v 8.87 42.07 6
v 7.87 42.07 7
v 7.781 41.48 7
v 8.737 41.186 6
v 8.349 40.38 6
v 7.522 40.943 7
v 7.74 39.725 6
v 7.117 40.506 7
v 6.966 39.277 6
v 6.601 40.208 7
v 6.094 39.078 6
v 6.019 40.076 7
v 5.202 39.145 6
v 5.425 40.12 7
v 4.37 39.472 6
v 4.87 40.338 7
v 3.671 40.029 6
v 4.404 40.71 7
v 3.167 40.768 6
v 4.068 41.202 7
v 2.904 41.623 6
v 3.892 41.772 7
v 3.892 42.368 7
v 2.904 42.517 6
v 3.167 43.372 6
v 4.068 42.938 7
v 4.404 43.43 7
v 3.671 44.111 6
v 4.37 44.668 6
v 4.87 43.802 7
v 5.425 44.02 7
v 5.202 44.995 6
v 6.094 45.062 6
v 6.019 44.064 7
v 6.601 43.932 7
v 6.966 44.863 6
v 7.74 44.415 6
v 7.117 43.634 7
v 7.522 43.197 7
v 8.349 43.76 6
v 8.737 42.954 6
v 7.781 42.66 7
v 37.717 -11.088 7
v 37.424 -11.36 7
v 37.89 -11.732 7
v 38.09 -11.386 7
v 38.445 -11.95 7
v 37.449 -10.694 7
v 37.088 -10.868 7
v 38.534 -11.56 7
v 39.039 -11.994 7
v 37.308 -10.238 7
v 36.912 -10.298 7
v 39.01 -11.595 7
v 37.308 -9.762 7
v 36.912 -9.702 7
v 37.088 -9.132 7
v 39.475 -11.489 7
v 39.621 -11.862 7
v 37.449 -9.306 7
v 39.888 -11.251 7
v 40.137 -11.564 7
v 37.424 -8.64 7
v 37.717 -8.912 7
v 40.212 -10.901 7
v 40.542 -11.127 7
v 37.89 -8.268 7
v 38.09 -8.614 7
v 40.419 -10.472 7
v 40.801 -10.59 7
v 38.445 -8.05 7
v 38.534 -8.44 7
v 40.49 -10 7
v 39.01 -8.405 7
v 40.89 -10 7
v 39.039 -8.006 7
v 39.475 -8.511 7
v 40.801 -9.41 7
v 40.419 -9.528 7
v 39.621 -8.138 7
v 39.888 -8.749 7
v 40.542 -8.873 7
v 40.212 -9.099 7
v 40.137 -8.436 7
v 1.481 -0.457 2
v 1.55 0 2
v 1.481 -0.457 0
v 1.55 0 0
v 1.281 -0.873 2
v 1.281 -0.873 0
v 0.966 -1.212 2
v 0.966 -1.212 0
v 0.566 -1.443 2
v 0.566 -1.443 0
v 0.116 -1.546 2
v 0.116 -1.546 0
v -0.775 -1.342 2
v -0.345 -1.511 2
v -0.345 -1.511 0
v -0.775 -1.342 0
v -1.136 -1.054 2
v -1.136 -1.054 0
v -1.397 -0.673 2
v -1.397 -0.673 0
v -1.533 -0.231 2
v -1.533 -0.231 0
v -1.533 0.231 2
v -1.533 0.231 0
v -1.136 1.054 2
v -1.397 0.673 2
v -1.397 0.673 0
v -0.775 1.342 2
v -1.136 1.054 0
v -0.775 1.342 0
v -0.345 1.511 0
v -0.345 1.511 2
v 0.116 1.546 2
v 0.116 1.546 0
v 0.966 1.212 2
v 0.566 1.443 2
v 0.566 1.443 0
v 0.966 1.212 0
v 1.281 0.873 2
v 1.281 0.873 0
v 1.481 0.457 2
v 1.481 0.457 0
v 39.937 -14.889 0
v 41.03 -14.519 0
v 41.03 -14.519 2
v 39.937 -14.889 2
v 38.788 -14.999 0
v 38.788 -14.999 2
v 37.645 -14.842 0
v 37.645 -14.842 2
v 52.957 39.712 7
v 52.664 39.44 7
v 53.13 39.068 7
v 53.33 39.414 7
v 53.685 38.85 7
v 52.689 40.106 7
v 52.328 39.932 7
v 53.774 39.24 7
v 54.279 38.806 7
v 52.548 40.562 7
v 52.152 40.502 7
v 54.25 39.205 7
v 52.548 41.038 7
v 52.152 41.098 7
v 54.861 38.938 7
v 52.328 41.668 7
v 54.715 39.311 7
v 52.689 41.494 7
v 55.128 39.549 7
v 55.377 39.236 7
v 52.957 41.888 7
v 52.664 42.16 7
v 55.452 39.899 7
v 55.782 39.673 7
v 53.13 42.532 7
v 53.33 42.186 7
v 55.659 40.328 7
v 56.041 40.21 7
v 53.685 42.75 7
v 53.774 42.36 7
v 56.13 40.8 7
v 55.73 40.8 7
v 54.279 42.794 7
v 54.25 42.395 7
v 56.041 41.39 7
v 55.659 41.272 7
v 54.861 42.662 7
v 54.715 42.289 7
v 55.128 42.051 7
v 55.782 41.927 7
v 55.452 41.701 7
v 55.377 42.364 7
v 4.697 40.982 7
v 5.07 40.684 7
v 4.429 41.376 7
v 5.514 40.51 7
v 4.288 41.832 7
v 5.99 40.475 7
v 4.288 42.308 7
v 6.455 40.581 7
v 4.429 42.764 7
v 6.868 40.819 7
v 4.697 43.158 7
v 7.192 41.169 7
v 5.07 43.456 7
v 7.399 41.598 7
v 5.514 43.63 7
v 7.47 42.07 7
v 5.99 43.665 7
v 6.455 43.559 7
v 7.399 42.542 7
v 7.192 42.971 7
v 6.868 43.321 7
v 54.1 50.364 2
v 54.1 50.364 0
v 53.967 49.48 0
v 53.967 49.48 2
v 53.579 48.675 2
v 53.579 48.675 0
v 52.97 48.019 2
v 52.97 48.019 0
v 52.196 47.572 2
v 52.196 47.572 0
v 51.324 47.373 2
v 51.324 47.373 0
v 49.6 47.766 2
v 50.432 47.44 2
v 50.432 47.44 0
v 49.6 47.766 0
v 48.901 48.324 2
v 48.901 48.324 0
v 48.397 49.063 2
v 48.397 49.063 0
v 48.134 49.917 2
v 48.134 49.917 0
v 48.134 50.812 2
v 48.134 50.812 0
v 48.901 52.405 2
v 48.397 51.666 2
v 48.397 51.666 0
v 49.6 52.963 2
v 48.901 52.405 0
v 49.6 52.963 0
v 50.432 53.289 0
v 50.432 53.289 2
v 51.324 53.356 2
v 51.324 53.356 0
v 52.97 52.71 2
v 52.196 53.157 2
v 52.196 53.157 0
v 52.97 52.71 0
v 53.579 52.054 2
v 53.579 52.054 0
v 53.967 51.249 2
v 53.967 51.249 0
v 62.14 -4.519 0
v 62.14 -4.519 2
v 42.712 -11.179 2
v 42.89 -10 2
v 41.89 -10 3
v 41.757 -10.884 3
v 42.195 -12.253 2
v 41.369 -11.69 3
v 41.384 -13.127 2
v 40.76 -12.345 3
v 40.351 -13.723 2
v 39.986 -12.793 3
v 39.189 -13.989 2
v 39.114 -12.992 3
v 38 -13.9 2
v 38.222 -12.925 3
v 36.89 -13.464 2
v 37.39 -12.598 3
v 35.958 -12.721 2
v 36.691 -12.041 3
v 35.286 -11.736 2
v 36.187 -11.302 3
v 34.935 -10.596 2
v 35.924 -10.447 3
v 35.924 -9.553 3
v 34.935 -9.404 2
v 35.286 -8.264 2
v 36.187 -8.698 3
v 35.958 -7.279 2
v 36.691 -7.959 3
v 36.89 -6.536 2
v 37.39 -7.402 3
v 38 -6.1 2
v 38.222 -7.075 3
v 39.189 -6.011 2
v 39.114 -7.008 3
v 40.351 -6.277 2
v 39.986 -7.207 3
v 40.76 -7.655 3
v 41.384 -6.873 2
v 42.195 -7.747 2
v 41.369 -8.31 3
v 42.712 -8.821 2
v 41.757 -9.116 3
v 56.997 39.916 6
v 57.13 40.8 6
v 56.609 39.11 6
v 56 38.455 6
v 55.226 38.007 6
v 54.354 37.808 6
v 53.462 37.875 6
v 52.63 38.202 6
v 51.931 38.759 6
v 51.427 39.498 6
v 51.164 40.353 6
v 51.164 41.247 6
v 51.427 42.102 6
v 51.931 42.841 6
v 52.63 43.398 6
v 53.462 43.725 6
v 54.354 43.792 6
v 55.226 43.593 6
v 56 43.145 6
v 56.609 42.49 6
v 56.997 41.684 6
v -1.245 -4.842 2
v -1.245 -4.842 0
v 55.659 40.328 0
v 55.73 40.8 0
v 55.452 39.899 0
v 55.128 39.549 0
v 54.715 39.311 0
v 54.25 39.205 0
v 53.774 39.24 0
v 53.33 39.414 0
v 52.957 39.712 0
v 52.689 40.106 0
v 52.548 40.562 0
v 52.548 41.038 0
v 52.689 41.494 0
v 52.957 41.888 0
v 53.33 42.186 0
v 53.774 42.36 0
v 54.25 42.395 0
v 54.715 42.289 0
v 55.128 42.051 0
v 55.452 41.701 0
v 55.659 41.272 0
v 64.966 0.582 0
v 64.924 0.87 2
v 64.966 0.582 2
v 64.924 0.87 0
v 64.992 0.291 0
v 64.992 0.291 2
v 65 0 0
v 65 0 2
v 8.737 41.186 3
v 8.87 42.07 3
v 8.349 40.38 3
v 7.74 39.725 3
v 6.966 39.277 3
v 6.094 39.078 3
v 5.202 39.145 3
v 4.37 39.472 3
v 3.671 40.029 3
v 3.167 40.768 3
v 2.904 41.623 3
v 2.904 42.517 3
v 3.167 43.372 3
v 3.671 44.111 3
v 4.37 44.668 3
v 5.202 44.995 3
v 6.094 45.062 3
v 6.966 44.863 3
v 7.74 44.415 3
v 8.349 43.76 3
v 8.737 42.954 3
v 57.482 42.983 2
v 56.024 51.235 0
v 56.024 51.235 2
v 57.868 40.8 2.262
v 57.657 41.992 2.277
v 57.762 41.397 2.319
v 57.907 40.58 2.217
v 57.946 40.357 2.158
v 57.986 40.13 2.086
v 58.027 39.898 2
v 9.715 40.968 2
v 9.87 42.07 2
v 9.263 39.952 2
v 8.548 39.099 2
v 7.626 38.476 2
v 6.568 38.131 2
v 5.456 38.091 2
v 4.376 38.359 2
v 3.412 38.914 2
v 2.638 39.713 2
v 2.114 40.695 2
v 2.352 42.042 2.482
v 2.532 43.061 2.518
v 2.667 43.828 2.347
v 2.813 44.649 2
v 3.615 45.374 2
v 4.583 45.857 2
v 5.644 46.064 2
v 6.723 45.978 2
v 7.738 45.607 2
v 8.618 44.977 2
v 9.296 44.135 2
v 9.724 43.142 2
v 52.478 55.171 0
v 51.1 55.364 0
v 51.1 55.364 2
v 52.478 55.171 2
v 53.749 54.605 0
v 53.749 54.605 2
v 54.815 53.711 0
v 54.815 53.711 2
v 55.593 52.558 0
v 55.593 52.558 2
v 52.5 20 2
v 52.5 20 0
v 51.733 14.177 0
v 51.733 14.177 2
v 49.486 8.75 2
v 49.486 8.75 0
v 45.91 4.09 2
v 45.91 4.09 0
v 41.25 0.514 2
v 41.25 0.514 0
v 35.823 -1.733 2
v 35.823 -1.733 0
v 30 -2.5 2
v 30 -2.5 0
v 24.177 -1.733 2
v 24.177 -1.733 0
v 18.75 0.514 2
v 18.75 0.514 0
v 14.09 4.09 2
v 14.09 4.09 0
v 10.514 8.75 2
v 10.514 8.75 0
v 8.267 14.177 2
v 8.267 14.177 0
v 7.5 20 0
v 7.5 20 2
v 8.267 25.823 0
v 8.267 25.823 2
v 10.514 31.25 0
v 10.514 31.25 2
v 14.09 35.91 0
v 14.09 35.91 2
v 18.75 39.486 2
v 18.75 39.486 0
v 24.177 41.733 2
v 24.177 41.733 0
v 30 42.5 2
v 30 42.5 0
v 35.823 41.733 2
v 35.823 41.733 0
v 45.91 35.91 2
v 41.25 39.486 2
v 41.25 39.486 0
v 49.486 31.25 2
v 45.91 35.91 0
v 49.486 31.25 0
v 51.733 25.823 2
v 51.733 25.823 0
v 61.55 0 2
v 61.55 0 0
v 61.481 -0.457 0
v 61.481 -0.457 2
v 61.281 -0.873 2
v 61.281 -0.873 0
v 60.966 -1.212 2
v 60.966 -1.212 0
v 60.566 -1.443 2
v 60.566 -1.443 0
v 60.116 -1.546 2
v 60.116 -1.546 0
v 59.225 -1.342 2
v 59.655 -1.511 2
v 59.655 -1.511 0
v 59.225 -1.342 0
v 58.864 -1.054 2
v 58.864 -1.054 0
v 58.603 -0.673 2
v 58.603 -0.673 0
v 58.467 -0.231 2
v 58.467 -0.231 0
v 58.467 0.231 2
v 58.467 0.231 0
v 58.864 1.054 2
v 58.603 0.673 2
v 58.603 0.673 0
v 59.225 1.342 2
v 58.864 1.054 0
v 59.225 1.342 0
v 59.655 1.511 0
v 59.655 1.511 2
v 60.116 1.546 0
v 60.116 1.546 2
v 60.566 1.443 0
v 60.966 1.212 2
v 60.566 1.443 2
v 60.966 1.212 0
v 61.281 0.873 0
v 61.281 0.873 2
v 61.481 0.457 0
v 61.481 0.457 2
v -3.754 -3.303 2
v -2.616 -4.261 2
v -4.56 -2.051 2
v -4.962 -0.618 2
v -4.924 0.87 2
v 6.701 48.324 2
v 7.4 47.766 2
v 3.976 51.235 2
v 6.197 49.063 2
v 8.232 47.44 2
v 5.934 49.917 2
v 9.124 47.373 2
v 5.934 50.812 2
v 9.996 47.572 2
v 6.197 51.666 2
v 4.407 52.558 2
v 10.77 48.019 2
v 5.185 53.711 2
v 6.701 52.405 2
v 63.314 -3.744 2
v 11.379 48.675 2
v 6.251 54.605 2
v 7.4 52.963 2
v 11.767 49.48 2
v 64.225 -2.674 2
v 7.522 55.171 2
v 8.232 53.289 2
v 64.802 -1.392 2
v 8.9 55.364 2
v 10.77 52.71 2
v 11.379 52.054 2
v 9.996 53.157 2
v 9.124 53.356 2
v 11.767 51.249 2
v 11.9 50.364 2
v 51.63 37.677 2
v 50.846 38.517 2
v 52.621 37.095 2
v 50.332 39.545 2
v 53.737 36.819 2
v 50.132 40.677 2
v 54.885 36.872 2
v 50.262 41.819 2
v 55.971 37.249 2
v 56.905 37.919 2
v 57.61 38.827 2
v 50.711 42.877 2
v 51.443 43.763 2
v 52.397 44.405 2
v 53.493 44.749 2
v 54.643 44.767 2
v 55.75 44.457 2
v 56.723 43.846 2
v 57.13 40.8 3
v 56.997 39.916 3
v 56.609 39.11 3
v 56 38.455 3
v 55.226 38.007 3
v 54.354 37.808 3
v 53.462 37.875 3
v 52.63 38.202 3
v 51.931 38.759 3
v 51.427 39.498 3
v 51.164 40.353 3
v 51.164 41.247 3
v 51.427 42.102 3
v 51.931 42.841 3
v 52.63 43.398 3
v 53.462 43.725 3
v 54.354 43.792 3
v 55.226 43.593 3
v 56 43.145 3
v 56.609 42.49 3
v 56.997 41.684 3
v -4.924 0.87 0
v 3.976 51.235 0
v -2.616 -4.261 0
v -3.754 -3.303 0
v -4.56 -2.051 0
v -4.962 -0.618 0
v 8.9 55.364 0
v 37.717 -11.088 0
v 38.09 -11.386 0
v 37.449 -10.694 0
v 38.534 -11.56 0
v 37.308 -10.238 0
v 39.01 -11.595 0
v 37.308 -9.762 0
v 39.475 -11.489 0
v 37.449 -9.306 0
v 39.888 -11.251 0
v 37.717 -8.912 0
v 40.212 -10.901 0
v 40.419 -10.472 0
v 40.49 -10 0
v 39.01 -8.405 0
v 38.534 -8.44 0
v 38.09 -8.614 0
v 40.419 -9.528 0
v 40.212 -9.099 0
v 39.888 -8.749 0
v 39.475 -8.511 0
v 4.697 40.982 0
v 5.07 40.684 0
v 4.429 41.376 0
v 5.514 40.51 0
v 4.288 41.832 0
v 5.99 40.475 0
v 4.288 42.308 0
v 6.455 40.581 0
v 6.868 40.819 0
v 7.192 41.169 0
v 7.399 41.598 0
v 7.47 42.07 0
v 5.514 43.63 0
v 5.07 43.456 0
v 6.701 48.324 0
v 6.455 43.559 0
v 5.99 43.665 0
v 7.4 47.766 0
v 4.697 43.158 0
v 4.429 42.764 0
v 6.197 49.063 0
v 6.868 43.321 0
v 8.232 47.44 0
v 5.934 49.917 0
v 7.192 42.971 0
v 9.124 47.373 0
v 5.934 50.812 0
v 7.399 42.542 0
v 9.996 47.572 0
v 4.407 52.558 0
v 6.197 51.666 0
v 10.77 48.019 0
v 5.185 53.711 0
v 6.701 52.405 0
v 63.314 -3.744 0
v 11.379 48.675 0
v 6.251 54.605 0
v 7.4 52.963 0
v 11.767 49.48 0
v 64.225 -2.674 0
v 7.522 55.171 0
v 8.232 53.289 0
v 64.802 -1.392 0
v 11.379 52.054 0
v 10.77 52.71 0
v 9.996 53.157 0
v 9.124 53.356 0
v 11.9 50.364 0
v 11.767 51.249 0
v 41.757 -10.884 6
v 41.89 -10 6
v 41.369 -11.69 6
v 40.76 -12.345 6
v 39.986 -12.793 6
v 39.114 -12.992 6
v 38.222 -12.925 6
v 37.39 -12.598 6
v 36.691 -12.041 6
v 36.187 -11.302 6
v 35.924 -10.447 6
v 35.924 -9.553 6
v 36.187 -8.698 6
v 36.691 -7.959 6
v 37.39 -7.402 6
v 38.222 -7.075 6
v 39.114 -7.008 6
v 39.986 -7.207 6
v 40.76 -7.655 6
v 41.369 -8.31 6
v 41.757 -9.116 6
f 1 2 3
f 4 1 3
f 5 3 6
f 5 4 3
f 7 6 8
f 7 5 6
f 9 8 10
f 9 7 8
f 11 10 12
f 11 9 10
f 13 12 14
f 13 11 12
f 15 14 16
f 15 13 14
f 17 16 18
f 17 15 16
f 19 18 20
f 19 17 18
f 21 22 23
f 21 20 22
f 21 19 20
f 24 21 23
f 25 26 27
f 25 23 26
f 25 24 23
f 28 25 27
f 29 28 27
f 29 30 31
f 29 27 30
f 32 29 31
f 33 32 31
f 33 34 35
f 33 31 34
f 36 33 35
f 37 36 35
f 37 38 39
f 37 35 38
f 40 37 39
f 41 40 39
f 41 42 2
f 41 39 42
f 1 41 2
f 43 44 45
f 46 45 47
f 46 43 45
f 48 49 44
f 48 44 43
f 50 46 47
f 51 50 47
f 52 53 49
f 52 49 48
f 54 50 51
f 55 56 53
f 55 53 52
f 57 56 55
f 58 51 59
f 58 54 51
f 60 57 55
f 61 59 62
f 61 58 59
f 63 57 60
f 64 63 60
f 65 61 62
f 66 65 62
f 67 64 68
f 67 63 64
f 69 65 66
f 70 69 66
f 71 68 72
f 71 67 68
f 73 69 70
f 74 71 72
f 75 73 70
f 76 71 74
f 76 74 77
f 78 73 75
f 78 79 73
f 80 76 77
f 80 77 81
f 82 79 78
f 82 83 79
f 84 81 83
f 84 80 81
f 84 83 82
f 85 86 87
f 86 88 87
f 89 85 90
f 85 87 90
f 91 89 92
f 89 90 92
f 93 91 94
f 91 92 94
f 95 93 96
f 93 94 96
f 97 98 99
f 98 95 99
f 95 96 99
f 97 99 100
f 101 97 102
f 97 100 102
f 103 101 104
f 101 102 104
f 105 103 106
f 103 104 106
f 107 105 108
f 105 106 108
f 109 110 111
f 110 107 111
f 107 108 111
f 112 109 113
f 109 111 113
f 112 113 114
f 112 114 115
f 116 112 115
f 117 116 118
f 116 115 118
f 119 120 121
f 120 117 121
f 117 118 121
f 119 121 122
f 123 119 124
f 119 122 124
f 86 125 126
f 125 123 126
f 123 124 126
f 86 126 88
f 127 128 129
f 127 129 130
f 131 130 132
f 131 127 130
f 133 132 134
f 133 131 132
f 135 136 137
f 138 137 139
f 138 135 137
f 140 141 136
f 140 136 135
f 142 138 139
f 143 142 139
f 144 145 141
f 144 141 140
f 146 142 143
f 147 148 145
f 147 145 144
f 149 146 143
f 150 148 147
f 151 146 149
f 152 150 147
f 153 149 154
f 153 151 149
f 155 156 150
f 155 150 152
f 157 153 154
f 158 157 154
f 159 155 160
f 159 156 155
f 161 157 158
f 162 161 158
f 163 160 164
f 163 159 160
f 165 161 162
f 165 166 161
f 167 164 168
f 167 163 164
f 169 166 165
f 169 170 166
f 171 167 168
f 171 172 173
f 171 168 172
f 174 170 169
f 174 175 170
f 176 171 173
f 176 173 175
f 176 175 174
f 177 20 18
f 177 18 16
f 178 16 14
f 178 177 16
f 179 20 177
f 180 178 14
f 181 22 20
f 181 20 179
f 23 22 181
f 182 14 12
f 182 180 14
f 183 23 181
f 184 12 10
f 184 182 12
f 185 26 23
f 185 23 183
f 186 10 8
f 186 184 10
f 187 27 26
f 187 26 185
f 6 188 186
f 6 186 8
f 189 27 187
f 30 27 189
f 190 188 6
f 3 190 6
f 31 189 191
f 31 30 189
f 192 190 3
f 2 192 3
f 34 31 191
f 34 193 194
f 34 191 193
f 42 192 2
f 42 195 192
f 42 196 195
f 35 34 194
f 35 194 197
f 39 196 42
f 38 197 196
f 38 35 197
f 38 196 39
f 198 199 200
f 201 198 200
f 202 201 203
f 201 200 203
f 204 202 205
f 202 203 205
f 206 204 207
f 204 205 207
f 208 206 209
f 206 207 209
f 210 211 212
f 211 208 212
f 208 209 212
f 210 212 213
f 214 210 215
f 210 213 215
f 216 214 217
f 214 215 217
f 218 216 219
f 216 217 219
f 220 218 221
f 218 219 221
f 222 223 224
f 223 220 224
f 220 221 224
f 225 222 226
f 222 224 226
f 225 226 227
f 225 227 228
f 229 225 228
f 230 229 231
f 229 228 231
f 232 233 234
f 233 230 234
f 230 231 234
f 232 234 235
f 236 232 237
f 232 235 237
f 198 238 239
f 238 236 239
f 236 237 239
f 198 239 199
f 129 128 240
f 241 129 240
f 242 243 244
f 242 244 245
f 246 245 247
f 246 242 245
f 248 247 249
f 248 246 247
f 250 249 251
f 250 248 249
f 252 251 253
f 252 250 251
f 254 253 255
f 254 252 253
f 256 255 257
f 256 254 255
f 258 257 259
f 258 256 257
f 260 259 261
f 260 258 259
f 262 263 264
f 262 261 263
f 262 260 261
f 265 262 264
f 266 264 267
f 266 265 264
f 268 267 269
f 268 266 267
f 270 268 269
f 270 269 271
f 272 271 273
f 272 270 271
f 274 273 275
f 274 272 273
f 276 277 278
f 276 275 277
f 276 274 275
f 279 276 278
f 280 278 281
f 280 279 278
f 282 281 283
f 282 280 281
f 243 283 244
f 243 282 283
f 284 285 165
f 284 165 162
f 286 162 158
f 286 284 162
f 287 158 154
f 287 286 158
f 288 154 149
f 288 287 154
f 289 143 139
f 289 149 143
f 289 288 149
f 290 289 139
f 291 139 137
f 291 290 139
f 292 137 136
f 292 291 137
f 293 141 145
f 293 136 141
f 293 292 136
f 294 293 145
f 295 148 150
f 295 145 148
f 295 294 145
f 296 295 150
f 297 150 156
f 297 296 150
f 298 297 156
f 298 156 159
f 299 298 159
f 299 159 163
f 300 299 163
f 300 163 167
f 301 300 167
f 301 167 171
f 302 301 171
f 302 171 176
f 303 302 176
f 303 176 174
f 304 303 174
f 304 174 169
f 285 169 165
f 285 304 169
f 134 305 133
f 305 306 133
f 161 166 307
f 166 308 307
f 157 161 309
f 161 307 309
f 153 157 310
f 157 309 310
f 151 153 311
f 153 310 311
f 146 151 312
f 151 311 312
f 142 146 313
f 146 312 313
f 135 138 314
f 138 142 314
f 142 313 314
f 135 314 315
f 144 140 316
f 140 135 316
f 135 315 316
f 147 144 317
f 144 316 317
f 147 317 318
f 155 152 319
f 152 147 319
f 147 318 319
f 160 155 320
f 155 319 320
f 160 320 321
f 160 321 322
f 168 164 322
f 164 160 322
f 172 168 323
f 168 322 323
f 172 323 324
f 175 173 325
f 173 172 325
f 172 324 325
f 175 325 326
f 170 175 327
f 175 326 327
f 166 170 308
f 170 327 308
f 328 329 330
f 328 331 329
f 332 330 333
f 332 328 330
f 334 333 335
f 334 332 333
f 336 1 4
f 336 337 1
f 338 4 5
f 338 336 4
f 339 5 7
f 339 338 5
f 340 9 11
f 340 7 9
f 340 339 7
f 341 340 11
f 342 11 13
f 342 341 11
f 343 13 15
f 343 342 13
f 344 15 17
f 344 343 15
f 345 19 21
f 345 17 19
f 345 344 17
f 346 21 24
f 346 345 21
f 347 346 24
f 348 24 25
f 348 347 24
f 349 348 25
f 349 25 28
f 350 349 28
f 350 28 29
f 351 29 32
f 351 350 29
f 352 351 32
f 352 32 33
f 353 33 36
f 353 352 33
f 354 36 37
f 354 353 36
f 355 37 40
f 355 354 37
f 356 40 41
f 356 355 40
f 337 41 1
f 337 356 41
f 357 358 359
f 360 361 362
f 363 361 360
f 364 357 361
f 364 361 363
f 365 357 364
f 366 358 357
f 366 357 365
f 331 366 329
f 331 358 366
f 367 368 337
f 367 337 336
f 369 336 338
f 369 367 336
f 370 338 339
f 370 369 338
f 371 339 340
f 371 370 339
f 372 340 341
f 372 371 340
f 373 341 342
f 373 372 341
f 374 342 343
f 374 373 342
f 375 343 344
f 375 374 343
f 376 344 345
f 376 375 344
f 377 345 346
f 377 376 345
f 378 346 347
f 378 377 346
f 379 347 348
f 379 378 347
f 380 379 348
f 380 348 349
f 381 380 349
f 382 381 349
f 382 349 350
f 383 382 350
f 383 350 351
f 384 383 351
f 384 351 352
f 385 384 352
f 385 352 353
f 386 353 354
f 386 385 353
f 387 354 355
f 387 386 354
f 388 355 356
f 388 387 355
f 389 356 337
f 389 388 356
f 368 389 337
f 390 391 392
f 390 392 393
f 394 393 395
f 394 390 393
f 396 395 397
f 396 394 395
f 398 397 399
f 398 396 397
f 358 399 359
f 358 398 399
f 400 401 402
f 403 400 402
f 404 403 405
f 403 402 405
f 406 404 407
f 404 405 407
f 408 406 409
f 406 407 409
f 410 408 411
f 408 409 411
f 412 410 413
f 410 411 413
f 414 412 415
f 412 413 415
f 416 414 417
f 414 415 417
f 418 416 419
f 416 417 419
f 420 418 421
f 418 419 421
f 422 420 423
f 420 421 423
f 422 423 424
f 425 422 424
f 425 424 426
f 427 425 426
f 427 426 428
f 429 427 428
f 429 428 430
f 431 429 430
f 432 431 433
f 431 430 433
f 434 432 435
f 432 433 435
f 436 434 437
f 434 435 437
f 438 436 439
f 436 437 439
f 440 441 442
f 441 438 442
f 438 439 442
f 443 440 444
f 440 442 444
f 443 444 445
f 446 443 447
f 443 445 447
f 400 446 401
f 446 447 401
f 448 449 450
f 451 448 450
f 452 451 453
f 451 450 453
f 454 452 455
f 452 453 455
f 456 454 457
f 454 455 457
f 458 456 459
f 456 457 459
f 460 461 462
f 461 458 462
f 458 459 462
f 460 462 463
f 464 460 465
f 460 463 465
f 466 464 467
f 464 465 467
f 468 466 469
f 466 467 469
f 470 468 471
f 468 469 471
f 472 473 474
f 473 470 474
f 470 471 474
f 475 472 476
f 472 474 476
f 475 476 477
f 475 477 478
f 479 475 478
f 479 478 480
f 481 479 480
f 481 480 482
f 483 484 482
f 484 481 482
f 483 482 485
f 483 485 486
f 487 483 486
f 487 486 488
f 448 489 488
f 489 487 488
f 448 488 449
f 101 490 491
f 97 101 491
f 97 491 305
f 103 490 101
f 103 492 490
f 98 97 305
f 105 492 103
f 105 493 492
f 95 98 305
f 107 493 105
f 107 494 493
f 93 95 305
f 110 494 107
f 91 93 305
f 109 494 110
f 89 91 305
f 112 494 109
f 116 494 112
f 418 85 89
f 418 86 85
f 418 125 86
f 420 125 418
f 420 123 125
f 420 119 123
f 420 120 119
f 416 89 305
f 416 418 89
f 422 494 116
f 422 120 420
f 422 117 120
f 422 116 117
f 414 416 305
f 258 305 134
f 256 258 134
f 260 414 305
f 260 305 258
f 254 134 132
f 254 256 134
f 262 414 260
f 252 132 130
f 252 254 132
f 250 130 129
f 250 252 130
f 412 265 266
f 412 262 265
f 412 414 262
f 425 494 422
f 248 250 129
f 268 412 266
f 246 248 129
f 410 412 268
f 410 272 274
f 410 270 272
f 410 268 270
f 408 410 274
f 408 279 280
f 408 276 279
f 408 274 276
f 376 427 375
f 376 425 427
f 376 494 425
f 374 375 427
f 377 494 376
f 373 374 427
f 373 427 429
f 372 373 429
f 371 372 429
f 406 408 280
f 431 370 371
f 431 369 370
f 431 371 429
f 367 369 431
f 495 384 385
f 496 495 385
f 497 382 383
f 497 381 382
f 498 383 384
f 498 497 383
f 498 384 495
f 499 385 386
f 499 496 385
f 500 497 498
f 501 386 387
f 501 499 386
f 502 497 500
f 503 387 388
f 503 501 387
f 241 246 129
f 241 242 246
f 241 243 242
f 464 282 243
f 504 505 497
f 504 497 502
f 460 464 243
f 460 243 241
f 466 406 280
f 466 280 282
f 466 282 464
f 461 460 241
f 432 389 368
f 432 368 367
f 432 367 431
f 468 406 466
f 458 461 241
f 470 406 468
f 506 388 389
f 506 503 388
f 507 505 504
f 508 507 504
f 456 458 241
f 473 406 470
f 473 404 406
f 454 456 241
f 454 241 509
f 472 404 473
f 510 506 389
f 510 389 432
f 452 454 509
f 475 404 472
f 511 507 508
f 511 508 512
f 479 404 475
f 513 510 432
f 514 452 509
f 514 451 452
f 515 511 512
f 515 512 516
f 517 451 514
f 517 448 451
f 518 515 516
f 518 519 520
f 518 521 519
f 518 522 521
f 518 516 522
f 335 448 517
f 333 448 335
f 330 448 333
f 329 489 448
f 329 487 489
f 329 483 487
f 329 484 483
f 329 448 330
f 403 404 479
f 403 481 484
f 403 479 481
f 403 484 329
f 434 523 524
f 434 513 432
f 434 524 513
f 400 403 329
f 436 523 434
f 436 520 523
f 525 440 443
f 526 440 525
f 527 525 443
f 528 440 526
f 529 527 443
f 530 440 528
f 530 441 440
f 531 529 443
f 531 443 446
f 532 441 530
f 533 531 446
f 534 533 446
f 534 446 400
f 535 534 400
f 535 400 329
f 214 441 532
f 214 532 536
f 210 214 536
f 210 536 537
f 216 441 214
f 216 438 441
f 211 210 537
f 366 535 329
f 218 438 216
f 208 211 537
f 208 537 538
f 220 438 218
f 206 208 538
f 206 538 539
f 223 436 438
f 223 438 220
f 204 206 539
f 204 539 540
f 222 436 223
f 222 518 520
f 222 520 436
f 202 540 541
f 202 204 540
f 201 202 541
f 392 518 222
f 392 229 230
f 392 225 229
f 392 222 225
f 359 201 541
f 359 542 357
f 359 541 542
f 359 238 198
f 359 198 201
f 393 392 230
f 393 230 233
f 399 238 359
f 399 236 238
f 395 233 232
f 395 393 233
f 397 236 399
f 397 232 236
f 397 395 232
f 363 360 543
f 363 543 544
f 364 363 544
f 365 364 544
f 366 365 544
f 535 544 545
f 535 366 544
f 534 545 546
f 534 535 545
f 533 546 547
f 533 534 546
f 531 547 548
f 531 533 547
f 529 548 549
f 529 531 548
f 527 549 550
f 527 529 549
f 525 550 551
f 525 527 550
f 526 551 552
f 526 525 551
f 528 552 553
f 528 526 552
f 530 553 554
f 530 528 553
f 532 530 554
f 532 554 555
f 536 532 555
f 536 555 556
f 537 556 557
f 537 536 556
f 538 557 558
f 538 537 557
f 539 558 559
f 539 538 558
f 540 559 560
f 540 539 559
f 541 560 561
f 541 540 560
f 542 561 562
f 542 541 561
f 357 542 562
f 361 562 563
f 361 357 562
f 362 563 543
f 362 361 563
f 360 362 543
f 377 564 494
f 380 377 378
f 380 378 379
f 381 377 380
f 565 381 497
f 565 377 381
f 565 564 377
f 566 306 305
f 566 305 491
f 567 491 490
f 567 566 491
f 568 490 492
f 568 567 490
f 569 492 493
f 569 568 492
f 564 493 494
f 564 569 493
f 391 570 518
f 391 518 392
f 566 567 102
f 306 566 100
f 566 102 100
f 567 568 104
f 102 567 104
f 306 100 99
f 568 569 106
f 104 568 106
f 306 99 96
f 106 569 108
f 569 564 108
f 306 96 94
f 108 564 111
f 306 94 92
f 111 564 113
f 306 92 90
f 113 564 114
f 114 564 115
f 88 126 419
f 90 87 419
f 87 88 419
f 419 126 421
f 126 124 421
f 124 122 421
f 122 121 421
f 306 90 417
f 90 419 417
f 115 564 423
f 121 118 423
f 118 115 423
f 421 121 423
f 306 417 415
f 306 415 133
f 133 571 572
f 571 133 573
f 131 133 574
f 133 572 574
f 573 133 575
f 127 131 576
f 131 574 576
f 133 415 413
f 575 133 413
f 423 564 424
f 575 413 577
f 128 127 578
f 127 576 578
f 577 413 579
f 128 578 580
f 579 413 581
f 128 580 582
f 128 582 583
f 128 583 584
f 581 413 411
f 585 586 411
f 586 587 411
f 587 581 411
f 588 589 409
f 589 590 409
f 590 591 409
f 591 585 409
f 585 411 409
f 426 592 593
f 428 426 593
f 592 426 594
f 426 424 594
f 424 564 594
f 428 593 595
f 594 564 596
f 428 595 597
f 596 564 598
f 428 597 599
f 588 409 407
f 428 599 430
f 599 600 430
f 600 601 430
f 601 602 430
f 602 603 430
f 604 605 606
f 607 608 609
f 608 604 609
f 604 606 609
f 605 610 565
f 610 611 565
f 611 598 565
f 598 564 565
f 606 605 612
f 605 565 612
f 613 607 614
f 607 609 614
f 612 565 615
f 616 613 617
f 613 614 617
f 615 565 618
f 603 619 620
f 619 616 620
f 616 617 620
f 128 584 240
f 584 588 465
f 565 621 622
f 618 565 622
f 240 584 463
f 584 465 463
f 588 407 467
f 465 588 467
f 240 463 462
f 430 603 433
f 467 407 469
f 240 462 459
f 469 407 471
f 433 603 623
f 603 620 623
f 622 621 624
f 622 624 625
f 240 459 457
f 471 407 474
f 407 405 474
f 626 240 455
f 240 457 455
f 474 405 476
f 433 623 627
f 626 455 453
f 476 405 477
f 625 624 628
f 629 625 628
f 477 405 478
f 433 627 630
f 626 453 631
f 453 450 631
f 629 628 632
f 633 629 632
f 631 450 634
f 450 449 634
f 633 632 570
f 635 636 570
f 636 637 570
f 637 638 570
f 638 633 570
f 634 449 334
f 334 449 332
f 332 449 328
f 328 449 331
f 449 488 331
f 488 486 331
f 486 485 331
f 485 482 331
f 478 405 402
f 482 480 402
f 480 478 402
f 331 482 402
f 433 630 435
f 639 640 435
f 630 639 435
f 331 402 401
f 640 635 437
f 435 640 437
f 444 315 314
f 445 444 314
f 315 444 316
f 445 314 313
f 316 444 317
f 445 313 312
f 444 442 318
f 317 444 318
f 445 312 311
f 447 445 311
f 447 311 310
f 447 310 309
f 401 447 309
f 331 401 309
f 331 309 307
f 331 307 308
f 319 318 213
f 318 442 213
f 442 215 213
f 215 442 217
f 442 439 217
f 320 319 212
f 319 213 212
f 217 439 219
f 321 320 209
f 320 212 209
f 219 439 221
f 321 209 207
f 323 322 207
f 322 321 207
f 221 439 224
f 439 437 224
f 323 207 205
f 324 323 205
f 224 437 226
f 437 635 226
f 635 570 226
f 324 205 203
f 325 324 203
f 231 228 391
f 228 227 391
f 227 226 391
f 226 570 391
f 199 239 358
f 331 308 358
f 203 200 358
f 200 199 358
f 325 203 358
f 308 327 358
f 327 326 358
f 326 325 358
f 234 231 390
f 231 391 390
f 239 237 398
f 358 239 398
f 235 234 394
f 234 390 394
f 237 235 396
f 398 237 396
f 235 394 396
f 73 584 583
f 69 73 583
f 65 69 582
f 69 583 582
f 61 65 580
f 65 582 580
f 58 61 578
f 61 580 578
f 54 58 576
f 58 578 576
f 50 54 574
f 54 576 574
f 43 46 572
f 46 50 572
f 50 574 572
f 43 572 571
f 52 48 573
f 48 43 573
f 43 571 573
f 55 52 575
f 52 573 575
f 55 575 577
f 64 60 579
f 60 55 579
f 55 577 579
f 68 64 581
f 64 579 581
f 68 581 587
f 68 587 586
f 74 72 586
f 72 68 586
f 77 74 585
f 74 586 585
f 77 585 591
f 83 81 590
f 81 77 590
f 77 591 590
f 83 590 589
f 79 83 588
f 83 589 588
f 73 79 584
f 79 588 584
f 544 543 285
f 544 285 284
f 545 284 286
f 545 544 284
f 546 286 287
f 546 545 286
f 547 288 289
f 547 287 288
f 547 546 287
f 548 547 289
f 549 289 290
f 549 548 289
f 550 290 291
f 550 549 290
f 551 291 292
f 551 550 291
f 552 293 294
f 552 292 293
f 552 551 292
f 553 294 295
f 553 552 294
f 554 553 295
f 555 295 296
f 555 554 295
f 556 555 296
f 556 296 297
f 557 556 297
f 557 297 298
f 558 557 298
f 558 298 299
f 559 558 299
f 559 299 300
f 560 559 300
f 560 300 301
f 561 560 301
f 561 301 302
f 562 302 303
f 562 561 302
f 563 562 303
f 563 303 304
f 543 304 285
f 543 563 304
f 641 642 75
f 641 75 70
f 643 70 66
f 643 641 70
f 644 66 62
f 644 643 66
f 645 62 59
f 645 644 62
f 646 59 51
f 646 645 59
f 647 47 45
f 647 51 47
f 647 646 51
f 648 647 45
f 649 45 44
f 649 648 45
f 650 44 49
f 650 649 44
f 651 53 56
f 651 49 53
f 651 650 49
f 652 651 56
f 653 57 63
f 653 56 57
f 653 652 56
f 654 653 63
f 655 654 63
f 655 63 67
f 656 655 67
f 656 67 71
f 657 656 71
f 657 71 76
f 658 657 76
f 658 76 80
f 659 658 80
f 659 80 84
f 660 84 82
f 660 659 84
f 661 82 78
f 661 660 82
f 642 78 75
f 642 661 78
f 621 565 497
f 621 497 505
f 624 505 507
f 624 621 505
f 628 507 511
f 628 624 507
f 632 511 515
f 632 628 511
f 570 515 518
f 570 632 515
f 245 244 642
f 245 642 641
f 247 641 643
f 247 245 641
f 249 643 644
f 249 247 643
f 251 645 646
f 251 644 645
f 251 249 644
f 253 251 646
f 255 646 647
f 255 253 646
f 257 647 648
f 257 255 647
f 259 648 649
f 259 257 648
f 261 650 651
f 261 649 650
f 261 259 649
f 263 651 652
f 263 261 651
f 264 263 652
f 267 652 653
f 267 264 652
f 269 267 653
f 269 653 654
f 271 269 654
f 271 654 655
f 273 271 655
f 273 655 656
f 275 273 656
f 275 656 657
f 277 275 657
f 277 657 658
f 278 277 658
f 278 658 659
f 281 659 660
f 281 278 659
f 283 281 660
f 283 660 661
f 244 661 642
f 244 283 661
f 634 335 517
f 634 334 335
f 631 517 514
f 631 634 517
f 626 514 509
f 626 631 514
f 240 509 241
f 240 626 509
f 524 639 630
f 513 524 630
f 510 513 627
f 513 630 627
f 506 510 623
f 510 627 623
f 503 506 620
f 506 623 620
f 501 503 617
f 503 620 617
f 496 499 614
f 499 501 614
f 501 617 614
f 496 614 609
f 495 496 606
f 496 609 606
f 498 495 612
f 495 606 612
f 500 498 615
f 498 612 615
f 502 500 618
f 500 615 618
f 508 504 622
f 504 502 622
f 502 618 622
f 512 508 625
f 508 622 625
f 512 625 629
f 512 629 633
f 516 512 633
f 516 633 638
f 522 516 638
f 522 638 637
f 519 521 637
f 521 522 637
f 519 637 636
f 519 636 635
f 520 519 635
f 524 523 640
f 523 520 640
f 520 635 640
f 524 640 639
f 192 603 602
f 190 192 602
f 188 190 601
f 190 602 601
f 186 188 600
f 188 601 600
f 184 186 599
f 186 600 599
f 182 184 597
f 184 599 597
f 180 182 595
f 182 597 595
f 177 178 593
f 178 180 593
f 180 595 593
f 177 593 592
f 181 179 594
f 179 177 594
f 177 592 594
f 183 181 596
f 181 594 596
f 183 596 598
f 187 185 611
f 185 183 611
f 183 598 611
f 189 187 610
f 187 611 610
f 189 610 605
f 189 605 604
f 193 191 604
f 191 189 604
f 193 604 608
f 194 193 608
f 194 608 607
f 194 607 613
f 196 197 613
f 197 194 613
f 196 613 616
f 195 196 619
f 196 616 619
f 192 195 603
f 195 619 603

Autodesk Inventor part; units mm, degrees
ref_plane "YZ Plane" through (0, 0, 0) normal (1, 0, 0) x (0, 1, 0)
ref_plane "XZ Plane" through (0, 0, 0) normal (0, 1, 0) x (-1, 0, 0)
ref_plane "XY Plane" through (0, 0, 0) normal (0, 0, 1) x (1, 0, 0)
sketch "Sketch1" plane through (0, 0, 0) normal (0, 0, 1) x (1, 0, 0)
  circle A0 centre (8.9, 50.3645) radius 1.55 construction
  circle A1 centre (8.9, 50.3645) radius 3
  circle A2 centre (51.1, 50.3645) radius 1.55 construction
  circle A3 centre (51.1, 50.3645) radius 3
  circle A4 centre (60, 0) radius 1.55
  circle A5 centre (60, 0) radius 1.55
  circle A6 centre (0, 0) radius 1.55
  circle A7 centre (0, 0) radius 1.55
  circle A8 centre (54.13, 40.8) radius 1.5999
  circle A9 centre (5.87, 42.07) radius 1.5999
  circle A10 centre (38.89, -10) radius 1.5999
  circle A11 centre (54.13, 40.8) radius 1.55 construction
  circle A12 centre (5.87, 42.07) radius 1.55 construction
  circle A13 centre (38.89, -10) radius 1.55 construction
  line L0 (8.9, 55.3645) -> (3.9, 55.3645) construction
  circle A14 centre (30, 20) radius 22.5
  arc A15 (38.89, -5) -> (37.7654, -14.8719) centre (38.89, -10) ccw construction
  arc A16 (37.6448, -14.8425) -> (41.0305, -14.5186) centre (38.89, -10) ccw
  line L1 (8.9, 55.3645) -> (8.9, 50.3645) construction
  line L2 (51.1, 55.3645) -> (51.1, 50.3645) construction
  arc A17 (-1.2452, -4.8425) -> (-5, 0) centre (0, 0) ccw construction
  arc A18 (65, 0) -> (64.9237, 0.8701) centre (60, 0) ccw
  line L3 (-1.2452, -4.8425) -> (37.6448, -14.8425)
  line L4 (41.0305, -14.5186) -> (62.1405, -4.5186)
  arc A19 (-4.9237, 0.8701) -> (-1.2452, -4.8425) centre (0, 0) ccw
  arc A20 (62.1405, -4.5186) -> (65, 0) centre (60, 0) ccw
  arc A21 (3.9763, 51.2346) -> (8.9, 55.3645) centre (8.9, 50.3645) ccw construction
  line L5 (-4.9237, 0.8701) -> (3.9763, 51.2346)
  line L6 (56.0237, 51.2346) -> (64.9237, 0.8701)
  arc A22 (64.9237, 0.8701) -> (62.1405, -4.5186) centre (60, 0) ccw construction
  arc A23 (41.0305, -14.5186) -> (38.89, -5) centre (38.89, -10) ccw construction
  line L7 (8.9, 55.3645) -> (51.1, 55.3645)
  arc A24 (8.9, 55.3645) -> (3.9763, 51.2346) centre (8.9, 50.3645) ccw
  circle A25 centre (51.1, 50.3645) radius 5
  point P0 (17, 90.5)
  dimension "d0" = 6
  dimension "d1" = 6
  dimension "d2" = 3.1
  dimension "d3" = 3.1
  dimension "d4" = 8.9
  dimension "d5" = 8.9
  dimension "d6" = 42.2
  dimension "d7" = 50.3645
  dimension "d8" = 0
  dimension "d9" = 0
  dimension "d10" = 3.1
  dimension "d11" = 3.1
  dimension "d12" = 3.1
  dimension "d13" = 52.07
  dimension "d14" = 50.8
  dimension "d15" = 33.02
  dimension "d16" = 15.24
  dimension "d19" = 5.87
  dimension "d51" = 5
  dimension "d52" = 45
  dimension "d55" = 10
  dimension "d56" = 10
  dimension "d65" = 20
  dimension "d66" = 21.1
  dimension "d67" = 10
  dimension "d68" = 10
  dimension "d69" = 10
  dimension "d71" = 10
extrude "Extrusion1" add sketch "Sketch1" along normal blind 2
sketch "Sketch5" plane through (0, 0, 2) normal (0, 0, 1) x (1, 0, 0)
  circle A0 centre (5.87, 42.07) radius 1.5999 projected
  circle A1 centre (5.87, 42.07) radius 3
  circle A2 centre (54.13, 40.8) radius 1.5999 projected
  circle A3 centre (54.13, 40.8) radius 3
  circle A4 centre (38.89, -10) radius 1.5999 projected
  circle A5 centre (38.89, -10) radius 3
  point P0 (0, 0)
  dimension "d57" = 6
  dimension "d58" = 6
  dimension "d59" = 6
extrude "Extrusion5" add sketch "Sketch5" along normal blind 5
chamfer "Chamfer3" distance 1 angle 45 6 edges at (2.87, 42.07, 2) (2.87, 42.07, 7) (51.13, 40.8, 2) (51.13, 40.8, 7) (35.89, -10, 2) (35.89, -10, 7)
equation "\"d19\" = -0.5 * d16 - 0.5 * d15 + 0.5 * d6 + 0.5 * d5 + 0.5 * d4"
equation "\"d66\" = 0.5 * d6"
properties part number "SimpleRTK - PlateAdapter"
